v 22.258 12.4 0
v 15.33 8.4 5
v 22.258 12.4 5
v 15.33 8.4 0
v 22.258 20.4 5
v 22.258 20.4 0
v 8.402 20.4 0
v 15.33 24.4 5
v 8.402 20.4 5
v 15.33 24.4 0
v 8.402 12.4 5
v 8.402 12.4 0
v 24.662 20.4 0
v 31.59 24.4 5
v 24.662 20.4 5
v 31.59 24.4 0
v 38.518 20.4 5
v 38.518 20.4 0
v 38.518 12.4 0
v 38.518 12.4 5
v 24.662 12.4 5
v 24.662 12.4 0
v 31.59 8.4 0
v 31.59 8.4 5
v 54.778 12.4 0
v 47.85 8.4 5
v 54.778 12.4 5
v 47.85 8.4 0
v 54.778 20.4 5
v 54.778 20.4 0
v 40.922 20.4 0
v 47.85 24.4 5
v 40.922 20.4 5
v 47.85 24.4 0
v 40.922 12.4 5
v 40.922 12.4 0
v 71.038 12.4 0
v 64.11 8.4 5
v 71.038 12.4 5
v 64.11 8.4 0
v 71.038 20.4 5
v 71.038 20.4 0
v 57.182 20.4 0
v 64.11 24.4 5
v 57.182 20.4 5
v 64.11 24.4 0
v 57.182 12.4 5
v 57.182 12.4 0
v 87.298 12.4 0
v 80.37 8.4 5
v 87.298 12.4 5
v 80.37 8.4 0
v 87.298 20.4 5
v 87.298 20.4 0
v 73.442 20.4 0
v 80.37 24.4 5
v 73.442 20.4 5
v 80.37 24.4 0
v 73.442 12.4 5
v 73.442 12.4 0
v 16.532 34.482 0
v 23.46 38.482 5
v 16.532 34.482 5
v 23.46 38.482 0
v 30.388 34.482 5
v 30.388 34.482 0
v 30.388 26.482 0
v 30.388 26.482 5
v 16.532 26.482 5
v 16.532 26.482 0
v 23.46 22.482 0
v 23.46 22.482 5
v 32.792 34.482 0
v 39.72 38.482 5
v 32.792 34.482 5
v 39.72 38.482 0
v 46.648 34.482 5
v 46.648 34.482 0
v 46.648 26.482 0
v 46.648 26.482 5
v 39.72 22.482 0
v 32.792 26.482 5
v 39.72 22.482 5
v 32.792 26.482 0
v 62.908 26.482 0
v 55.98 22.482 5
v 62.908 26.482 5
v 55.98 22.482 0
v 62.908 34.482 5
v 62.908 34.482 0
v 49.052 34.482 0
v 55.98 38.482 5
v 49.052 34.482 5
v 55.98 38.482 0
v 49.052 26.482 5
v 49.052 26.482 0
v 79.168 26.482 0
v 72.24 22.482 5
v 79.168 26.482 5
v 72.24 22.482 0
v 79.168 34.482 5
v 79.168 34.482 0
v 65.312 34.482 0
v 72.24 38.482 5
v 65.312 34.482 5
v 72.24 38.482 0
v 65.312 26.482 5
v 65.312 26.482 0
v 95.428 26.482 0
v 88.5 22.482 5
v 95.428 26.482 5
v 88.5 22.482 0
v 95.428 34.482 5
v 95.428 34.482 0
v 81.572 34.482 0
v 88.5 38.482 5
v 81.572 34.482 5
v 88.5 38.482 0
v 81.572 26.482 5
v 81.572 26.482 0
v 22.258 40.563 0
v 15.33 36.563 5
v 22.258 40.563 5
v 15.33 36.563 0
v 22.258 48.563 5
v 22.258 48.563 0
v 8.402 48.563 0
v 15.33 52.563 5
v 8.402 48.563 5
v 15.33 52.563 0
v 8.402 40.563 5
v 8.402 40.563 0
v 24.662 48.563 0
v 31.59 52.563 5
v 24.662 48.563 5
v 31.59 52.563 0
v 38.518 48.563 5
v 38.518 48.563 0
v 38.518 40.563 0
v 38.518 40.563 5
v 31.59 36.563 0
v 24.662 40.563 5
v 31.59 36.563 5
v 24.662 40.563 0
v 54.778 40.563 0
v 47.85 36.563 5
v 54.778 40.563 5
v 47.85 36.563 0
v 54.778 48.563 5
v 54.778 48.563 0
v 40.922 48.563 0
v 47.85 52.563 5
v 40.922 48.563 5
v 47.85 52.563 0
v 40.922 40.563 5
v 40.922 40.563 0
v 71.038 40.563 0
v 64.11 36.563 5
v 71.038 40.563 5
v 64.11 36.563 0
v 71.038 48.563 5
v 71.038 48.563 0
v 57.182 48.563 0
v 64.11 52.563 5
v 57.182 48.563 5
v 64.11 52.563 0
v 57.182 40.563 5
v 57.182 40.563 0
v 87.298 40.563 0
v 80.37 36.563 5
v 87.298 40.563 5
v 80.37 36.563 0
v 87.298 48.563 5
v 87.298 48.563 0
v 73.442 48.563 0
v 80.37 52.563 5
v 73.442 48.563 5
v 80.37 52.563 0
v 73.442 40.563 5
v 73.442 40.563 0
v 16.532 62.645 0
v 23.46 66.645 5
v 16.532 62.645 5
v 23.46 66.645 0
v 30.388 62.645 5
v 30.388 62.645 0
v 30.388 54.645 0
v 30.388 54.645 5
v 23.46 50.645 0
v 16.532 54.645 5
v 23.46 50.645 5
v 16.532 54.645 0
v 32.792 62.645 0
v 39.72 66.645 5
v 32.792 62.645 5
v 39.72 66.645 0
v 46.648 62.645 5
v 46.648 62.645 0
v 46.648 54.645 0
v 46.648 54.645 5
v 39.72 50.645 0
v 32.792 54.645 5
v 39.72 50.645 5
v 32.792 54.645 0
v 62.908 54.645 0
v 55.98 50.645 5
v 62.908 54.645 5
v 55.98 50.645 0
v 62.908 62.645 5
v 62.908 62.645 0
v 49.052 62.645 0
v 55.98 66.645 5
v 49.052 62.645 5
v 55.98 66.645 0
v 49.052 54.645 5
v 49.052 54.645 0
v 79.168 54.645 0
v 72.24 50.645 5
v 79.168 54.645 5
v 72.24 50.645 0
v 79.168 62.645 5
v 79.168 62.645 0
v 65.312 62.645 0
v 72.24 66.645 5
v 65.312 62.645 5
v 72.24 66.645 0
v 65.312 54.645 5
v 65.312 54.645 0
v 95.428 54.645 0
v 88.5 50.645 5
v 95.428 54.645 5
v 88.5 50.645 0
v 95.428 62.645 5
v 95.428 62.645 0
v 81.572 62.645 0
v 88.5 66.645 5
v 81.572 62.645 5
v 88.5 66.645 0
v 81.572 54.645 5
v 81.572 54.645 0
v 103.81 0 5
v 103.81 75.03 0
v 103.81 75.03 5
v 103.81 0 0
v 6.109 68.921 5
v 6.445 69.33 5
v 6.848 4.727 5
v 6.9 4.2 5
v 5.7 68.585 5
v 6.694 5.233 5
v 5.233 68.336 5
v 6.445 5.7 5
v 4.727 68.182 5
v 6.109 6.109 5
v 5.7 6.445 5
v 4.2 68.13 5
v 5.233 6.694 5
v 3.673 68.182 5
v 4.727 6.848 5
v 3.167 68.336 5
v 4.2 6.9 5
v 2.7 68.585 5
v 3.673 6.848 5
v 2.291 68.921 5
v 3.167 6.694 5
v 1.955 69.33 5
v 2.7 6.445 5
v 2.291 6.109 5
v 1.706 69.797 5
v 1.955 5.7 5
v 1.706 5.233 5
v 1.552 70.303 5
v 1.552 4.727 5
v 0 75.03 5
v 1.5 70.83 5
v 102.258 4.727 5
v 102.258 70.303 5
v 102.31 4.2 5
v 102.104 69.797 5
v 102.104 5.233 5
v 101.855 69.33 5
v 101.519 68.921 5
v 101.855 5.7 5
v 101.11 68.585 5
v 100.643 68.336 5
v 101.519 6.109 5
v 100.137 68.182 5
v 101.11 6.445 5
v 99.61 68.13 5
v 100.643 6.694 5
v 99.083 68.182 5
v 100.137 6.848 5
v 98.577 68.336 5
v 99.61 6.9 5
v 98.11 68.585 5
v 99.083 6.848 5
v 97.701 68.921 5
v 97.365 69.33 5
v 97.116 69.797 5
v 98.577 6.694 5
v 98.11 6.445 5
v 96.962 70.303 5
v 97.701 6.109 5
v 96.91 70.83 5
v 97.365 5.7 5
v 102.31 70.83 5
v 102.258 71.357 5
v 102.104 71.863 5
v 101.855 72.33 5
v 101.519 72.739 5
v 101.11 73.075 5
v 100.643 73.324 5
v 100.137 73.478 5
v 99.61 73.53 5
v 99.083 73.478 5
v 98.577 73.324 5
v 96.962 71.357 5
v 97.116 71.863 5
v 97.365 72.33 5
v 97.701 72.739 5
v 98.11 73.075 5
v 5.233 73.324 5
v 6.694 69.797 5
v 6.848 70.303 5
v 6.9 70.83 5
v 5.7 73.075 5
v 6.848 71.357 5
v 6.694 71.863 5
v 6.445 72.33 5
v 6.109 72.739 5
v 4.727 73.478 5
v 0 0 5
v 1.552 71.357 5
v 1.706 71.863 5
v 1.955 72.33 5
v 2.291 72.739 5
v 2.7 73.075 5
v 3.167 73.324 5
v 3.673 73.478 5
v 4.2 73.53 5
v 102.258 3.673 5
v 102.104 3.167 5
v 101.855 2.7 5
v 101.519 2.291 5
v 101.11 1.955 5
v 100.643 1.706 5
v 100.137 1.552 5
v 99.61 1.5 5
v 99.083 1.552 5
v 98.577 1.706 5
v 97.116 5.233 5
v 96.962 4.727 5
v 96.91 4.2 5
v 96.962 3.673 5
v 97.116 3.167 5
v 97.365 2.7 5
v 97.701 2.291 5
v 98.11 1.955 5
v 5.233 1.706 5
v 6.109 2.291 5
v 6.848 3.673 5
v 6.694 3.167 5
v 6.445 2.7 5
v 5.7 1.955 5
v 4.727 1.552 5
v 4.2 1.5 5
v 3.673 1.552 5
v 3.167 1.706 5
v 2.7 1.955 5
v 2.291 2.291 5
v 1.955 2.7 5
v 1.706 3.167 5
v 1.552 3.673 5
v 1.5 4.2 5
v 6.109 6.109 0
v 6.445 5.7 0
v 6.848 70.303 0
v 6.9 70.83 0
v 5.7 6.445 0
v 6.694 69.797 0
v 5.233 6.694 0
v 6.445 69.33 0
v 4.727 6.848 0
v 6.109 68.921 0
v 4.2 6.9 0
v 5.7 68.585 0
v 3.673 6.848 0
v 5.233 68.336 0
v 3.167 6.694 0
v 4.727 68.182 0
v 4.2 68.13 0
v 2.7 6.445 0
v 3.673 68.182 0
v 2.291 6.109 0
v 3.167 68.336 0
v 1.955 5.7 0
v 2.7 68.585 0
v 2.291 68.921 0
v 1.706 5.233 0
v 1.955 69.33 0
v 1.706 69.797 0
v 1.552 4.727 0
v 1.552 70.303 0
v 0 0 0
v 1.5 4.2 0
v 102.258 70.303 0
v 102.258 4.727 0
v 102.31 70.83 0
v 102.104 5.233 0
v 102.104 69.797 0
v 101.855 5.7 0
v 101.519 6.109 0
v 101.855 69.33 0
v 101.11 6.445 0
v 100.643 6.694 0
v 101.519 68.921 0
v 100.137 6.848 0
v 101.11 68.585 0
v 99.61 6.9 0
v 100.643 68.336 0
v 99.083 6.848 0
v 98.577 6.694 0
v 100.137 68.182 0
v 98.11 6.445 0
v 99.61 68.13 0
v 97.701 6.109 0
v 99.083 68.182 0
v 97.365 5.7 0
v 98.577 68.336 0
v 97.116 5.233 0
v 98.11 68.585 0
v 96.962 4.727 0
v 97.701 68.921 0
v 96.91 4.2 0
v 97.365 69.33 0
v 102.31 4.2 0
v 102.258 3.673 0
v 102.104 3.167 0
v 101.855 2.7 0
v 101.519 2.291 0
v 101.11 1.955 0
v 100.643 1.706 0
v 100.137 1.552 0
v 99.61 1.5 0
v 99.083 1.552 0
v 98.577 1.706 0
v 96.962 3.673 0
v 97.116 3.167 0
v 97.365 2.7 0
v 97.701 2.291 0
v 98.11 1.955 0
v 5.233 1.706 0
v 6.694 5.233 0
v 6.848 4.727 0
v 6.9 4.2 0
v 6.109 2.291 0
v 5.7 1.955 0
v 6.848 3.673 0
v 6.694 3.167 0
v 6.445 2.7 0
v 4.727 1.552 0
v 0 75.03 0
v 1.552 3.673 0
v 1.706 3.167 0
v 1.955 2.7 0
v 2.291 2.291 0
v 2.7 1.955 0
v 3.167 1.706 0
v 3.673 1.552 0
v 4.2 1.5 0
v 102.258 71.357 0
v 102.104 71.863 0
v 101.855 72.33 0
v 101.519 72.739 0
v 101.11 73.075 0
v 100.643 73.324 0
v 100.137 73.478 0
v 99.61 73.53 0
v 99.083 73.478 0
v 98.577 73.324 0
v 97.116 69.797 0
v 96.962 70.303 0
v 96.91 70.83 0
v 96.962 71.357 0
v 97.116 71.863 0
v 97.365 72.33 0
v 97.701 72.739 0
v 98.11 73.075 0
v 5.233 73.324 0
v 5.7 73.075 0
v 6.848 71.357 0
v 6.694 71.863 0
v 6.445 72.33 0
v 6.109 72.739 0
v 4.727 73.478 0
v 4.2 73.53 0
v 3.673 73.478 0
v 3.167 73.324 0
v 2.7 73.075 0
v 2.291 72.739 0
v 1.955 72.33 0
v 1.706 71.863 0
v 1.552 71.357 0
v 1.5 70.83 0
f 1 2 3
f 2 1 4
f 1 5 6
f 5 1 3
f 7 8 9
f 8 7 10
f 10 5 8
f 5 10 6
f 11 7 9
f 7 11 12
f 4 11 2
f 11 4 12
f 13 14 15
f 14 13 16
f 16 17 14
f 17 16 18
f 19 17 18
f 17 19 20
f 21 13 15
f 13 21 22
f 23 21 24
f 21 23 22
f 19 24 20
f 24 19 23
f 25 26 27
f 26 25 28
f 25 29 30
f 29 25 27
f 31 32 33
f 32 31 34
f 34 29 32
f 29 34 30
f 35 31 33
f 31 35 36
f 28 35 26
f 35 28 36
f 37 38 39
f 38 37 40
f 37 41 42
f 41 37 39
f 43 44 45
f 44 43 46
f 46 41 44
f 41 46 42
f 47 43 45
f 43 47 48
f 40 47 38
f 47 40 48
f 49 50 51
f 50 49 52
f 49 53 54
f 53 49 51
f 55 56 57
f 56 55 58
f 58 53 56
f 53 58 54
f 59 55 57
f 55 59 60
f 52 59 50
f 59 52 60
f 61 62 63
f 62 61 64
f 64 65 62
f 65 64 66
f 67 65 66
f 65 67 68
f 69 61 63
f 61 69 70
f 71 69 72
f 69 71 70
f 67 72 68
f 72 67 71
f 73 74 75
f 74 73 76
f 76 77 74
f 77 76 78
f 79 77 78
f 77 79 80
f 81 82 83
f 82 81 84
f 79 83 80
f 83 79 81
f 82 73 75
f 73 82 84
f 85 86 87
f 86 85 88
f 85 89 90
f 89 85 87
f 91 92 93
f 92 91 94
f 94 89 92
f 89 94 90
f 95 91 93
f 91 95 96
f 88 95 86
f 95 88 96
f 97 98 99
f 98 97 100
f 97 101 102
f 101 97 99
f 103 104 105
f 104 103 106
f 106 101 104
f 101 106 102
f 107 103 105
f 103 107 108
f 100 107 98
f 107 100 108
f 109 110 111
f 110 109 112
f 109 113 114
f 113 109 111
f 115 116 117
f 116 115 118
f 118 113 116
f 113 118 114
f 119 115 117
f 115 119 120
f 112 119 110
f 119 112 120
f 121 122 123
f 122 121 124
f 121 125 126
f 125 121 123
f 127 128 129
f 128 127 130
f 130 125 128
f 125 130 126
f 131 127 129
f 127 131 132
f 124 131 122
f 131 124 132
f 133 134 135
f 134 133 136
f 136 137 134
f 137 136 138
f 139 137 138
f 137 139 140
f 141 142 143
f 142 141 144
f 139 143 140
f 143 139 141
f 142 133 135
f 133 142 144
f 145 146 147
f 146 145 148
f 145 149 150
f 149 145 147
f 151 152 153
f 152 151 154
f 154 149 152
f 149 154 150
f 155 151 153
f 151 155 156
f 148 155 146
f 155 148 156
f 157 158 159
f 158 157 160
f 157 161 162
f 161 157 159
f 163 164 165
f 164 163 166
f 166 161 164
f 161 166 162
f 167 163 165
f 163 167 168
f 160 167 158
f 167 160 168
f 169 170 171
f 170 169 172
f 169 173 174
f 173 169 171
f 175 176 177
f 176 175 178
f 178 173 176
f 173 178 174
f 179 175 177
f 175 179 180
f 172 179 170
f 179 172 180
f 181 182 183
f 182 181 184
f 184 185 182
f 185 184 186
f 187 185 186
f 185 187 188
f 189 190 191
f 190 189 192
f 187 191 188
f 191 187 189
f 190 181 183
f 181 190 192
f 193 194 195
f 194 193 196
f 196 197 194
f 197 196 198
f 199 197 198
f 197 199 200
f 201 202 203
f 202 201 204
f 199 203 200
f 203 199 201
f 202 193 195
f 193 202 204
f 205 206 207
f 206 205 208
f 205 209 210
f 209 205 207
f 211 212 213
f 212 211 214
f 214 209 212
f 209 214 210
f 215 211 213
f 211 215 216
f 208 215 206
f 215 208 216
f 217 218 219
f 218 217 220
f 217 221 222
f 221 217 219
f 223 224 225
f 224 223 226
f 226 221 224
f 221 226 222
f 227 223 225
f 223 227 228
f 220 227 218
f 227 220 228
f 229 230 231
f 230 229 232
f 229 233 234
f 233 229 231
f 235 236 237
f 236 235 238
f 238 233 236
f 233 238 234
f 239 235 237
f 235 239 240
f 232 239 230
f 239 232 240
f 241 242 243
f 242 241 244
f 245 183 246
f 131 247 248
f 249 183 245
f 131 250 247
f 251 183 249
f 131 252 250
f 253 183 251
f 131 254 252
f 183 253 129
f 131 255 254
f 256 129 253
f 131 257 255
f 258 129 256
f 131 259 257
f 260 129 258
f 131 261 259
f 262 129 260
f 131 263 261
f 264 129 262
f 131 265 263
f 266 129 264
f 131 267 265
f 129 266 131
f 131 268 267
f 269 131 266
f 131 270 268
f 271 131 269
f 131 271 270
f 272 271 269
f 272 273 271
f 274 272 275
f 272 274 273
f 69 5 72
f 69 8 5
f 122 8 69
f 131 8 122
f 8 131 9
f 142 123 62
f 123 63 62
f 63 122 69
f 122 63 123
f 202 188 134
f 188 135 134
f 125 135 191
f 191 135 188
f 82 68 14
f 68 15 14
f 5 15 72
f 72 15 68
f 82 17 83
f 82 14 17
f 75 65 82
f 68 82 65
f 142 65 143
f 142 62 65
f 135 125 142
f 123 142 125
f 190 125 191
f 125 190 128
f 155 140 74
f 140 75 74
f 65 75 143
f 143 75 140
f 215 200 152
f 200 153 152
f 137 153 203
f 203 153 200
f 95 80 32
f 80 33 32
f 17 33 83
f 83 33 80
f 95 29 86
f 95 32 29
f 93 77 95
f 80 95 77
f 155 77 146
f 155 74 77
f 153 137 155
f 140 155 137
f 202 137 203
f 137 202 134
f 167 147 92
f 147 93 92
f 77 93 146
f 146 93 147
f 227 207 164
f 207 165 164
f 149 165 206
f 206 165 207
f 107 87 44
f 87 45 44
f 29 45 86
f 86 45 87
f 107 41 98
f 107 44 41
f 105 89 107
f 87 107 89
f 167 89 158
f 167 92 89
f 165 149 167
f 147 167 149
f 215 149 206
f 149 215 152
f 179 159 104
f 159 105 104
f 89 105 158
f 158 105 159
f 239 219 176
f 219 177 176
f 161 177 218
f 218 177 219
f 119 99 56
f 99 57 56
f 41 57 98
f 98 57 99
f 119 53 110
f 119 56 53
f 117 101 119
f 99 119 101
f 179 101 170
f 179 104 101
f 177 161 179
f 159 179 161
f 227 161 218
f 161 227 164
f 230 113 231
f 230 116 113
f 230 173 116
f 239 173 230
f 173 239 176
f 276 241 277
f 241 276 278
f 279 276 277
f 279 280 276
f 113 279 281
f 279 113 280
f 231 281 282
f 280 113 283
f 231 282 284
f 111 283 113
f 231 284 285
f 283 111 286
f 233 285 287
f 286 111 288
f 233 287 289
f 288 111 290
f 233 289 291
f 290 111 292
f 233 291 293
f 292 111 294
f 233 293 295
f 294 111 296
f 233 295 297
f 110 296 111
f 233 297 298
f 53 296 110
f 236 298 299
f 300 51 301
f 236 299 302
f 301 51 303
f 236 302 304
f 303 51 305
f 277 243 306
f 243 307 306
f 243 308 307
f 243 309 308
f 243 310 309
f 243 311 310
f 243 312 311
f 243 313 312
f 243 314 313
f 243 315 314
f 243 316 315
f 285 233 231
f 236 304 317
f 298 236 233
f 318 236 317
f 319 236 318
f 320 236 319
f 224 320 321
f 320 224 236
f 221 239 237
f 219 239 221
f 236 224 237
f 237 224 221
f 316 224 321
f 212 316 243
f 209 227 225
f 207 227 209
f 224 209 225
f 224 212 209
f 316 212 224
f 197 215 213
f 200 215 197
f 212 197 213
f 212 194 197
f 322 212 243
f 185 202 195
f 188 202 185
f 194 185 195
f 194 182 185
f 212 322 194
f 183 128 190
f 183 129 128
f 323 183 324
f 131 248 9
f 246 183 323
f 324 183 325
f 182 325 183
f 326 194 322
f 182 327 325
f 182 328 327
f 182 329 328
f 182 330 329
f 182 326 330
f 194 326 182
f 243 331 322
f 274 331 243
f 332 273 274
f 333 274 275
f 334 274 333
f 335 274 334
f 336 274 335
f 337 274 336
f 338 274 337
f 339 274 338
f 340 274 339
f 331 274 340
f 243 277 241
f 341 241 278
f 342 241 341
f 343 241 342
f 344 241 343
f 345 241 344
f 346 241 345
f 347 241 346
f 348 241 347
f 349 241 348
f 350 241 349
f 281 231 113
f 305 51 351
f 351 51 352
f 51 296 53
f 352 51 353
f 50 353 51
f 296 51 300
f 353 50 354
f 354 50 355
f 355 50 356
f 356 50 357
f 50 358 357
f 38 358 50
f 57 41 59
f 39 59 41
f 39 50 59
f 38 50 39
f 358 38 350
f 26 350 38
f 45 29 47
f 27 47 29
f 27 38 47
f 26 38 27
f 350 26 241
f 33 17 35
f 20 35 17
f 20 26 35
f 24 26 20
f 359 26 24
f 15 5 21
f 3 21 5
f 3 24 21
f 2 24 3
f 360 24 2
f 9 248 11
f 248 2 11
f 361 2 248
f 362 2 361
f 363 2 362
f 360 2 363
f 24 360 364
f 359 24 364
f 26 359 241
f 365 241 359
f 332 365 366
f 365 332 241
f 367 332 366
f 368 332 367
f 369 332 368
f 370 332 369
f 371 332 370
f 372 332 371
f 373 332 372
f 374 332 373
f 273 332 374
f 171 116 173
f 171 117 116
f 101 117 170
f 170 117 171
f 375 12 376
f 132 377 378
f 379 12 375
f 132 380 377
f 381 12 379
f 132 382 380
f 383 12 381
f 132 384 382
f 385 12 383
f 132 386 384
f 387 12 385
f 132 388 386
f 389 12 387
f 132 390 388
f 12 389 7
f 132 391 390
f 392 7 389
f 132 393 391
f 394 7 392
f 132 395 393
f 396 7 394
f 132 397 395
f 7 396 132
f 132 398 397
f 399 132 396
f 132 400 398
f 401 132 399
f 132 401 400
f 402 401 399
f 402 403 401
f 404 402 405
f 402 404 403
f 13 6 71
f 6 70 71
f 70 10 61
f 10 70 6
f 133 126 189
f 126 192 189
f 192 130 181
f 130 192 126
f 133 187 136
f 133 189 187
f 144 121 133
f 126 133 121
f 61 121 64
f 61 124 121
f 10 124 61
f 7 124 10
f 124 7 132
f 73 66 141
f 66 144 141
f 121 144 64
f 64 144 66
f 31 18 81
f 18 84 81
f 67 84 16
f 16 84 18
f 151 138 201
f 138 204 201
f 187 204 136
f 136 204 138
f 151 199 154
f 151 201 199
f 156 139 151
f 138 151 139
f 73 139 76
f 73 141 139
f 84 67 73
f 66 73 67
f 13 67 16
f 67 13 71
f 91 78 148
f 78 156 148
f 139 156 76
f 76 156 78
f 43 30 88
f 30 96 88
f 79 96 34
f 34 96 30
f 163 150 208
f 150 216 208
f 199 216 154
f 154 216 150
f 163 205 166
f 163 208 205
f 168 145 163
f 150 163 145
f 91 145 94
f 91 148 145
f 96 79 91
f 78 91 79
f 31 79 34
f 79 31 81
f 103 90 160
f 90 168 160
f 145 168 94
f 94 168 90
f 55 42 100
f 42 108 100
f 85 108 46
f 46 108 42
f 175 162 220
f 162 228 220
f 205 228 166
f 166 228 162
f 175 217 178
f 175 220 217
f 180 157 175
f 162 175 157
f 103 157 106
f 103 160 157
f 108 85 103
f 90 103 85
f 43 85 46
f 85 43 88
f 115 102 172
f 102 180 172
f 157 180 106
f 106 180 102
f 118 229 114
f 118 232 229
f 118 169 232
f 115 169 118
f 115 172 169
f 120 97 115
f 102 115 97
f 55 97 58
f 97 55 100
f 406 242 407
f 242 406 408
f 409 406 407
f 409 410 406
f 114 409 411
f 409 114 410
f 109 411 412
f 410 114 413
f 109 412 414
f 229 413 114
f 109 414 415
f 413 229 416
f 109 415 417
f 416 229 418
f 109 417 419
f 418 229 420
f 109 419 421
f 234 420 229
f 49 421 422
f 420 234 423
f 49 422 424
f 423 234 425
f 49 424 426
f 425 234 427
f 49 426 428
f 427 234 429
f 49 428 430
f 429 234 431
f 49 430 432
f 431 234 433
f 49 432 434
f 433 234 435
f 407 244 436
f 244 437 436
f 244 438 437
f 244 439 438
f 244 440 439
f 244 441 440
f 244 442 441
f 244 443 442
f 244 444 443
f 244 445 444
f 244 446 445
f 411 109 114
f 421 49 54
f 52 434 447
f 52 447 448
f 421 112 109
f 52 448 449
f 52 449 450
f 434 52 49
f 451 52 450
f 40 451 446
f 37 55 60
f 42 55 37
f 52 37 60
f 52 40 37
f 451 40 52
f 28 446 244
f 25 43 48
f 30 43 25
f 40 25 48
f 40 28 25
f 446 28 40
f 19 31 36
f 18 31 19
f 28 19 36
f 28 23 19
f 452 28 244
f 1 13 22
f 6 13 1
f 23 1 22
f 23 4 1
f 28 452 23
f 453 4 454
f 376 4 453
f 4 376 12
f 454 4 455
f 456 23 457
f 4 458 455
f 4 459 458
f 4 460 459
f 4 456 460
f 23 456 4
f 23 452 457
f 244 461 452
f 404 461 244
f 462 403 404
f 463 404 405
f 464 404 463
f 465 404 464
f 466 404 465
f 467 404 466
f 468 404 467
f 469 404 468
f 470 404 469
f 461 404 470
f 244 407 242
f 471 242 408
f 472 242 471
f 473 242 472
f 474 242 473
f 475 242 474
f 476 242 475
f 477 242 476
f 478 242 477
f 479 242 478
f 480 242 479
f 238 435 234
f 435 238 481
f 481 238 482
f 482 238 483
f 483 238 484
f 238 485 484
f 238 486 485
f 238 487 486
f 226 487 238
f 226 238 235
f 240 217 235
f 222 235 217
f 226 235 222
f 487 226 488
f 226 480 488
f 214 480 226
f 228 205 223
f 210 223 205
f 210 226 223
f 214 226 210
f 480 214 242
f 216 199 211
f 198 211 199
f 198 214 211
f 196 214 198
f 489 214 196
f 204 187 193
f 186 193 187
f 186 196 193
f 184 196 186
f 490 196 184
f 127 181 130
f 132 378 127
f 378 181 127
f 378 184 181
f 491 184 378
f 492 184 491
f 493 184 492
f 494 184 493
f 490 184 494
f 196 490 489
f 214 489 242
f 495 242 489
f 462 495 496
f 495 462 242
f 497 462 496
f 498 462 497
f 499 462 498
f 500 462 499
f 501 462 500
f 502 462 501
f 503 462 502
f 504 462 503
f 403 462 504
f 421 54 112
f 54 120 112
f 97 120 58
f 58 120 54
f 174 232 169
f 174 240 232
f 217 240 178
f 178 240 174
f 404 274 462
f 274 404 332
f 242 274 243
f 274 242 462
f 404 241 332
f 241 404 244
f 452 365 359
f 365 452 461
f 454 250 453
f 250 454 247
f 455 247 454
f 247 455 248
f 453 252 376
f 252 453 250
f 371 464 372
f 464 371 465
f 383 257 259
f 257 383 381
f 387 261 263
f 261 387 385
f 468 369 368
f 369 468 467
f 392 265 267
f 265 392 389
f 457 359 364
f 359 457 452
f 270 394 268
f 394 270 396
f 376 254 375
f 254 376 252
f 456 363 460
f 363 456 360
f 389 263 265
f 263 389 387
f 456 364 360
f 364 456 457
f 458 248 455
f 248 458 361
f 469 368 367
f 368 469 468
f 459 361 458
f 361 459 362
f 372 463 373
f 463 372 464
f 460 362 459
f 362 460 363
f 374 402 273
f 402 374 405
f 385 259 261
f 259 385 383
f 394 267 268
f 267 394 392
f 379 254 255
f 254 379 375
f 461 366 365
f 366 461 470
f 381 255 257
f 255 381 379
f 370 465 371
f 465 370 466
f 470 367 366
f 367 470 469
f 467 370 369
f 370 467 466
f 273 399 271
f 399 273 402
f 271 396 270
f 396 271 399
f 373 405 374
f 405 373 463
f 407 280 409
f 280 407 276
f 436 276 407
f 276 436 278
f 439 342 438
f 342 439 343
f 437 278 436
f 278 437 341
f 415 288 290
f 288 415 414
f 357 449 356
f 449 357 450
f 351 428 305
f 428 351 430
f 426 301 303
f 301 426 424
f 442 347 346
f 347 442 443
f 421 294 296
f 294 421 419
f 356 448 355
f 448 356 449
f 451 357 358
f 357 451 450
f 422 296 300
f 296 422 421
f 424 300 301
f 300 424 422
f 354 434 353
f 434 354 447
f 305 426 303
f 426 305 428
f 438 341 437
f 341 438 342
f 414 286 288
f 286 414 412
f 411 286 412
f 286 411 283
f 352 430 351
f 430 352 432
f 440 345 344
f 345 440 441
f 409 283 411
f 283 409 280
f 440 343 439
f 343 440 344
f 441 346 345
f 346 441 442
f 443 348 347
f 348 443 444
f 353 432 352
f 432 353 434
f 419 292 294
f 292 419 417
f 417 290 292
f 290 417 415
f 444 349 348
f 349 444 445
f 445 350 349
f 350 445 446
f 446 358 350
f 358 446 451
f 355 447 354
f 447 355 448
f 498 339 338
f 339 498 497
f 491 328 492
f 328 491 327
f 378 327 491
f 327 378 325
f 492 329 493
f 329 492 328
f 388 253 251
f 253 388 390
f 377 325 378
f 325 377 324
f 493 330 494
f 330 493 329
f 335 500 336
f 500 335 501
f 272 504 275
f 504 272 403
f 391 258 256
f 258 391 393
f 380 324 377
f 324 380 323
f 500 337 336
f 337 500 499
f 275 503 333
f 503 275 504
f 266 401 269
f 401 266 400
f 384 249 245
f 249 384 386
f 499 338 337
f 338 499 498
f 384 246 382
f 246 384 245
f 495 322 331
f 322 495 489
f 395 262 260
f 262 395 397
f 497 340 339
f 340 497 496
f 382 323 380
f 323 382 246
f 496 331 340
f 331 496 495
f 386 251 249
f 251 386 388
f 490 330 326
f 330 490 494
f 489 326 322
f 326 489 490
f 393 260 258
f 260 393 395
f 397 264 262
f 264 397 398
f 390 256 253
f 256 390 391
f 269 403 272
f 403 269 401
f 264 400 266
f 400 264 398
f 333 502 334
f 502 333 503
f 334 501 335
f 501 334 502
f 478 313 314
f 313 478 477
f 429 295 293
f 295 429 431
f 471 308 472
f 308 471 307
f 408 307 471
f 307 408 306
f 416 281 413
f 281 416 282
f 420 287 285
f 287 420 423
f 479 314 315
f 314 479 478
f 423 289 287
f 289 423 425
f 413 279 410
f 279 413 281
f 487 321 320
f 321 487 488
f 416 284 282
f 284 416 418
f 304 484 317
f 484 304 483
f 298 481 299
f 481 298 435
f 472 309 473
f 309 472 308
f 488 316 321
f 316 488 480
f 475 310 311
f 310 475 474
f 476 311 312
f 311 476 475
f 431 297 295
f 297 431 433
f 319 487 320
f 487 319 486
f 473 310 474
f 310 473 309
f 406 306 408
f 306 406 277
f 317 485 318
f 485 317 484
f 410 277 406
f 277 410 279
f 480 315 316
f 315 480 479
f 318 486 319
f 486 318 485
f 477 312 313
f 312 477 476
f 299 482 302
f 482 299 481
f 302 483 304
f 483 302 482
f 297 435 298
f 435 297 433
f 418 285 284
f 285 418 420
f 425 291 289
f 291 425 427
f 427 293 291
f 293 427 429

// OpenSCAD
$fn = 32;

// ----------------------------------------------------------------------
// Honeycomb panel: 103.81 x 75.03 mm, 20 cells of 16 mm
// ----------------------------------------------------------------------

// --- parameters (mm) ---
panel_w = 103.81;         // panel width
panel_d = 75.03;          // panel depth
thick = 5;                // panel thickness
cell_r = 8;               // hex cell circumradius
pitch = 16.26;            // hex cell pitch (centre to centre)
web = 2.4;                // web between the cells
columns = 5;              // columns of cells
rows = 4;                 // rows of cells
cell_count = 20;          // total cells
shift_x = 15.33;          // first cell offset in x
shift_y = 16.4;           // first cell offset in y
mount_d = 5.4;            // corner mounting holes
hole_off = 4.2;           // mounting hole offset from the corners

difference() {
  union() {
    cube([panel_w, panel_d, thick]);
  }
  /* hexagonal cells, point-up, cut right through the plate */
  for (row = [0 : rows - 1]) {
    for (col = [0 : columns - 1]) {
      translate([shift_x + col * pitch + (row % 2) * pitch / 2, shift_y + row * pitch * 0.866025, -2.5]) rotate([0, 0, 30]) cylinder(h = thick + 5, d = 2 * cell_r, $fn = 6);
    }
  }
  /* corner mounting holes, clear of the outer cell web */
  translate([4.2, 4.2, -2.5]) cylinder(h = thick + 5, d = mount_d);
  translate([99.61, 4.2, -2.5]) cylinder(h = thick + 5, d = mount_d);
  translate([4.2, 70.83, -2.5]) cylinder(h = thick + 5, d = mount_d);
  translate([99.61, 70.83, -2.5]) cylinder(h = thick + 5, d = mount_d);
}
